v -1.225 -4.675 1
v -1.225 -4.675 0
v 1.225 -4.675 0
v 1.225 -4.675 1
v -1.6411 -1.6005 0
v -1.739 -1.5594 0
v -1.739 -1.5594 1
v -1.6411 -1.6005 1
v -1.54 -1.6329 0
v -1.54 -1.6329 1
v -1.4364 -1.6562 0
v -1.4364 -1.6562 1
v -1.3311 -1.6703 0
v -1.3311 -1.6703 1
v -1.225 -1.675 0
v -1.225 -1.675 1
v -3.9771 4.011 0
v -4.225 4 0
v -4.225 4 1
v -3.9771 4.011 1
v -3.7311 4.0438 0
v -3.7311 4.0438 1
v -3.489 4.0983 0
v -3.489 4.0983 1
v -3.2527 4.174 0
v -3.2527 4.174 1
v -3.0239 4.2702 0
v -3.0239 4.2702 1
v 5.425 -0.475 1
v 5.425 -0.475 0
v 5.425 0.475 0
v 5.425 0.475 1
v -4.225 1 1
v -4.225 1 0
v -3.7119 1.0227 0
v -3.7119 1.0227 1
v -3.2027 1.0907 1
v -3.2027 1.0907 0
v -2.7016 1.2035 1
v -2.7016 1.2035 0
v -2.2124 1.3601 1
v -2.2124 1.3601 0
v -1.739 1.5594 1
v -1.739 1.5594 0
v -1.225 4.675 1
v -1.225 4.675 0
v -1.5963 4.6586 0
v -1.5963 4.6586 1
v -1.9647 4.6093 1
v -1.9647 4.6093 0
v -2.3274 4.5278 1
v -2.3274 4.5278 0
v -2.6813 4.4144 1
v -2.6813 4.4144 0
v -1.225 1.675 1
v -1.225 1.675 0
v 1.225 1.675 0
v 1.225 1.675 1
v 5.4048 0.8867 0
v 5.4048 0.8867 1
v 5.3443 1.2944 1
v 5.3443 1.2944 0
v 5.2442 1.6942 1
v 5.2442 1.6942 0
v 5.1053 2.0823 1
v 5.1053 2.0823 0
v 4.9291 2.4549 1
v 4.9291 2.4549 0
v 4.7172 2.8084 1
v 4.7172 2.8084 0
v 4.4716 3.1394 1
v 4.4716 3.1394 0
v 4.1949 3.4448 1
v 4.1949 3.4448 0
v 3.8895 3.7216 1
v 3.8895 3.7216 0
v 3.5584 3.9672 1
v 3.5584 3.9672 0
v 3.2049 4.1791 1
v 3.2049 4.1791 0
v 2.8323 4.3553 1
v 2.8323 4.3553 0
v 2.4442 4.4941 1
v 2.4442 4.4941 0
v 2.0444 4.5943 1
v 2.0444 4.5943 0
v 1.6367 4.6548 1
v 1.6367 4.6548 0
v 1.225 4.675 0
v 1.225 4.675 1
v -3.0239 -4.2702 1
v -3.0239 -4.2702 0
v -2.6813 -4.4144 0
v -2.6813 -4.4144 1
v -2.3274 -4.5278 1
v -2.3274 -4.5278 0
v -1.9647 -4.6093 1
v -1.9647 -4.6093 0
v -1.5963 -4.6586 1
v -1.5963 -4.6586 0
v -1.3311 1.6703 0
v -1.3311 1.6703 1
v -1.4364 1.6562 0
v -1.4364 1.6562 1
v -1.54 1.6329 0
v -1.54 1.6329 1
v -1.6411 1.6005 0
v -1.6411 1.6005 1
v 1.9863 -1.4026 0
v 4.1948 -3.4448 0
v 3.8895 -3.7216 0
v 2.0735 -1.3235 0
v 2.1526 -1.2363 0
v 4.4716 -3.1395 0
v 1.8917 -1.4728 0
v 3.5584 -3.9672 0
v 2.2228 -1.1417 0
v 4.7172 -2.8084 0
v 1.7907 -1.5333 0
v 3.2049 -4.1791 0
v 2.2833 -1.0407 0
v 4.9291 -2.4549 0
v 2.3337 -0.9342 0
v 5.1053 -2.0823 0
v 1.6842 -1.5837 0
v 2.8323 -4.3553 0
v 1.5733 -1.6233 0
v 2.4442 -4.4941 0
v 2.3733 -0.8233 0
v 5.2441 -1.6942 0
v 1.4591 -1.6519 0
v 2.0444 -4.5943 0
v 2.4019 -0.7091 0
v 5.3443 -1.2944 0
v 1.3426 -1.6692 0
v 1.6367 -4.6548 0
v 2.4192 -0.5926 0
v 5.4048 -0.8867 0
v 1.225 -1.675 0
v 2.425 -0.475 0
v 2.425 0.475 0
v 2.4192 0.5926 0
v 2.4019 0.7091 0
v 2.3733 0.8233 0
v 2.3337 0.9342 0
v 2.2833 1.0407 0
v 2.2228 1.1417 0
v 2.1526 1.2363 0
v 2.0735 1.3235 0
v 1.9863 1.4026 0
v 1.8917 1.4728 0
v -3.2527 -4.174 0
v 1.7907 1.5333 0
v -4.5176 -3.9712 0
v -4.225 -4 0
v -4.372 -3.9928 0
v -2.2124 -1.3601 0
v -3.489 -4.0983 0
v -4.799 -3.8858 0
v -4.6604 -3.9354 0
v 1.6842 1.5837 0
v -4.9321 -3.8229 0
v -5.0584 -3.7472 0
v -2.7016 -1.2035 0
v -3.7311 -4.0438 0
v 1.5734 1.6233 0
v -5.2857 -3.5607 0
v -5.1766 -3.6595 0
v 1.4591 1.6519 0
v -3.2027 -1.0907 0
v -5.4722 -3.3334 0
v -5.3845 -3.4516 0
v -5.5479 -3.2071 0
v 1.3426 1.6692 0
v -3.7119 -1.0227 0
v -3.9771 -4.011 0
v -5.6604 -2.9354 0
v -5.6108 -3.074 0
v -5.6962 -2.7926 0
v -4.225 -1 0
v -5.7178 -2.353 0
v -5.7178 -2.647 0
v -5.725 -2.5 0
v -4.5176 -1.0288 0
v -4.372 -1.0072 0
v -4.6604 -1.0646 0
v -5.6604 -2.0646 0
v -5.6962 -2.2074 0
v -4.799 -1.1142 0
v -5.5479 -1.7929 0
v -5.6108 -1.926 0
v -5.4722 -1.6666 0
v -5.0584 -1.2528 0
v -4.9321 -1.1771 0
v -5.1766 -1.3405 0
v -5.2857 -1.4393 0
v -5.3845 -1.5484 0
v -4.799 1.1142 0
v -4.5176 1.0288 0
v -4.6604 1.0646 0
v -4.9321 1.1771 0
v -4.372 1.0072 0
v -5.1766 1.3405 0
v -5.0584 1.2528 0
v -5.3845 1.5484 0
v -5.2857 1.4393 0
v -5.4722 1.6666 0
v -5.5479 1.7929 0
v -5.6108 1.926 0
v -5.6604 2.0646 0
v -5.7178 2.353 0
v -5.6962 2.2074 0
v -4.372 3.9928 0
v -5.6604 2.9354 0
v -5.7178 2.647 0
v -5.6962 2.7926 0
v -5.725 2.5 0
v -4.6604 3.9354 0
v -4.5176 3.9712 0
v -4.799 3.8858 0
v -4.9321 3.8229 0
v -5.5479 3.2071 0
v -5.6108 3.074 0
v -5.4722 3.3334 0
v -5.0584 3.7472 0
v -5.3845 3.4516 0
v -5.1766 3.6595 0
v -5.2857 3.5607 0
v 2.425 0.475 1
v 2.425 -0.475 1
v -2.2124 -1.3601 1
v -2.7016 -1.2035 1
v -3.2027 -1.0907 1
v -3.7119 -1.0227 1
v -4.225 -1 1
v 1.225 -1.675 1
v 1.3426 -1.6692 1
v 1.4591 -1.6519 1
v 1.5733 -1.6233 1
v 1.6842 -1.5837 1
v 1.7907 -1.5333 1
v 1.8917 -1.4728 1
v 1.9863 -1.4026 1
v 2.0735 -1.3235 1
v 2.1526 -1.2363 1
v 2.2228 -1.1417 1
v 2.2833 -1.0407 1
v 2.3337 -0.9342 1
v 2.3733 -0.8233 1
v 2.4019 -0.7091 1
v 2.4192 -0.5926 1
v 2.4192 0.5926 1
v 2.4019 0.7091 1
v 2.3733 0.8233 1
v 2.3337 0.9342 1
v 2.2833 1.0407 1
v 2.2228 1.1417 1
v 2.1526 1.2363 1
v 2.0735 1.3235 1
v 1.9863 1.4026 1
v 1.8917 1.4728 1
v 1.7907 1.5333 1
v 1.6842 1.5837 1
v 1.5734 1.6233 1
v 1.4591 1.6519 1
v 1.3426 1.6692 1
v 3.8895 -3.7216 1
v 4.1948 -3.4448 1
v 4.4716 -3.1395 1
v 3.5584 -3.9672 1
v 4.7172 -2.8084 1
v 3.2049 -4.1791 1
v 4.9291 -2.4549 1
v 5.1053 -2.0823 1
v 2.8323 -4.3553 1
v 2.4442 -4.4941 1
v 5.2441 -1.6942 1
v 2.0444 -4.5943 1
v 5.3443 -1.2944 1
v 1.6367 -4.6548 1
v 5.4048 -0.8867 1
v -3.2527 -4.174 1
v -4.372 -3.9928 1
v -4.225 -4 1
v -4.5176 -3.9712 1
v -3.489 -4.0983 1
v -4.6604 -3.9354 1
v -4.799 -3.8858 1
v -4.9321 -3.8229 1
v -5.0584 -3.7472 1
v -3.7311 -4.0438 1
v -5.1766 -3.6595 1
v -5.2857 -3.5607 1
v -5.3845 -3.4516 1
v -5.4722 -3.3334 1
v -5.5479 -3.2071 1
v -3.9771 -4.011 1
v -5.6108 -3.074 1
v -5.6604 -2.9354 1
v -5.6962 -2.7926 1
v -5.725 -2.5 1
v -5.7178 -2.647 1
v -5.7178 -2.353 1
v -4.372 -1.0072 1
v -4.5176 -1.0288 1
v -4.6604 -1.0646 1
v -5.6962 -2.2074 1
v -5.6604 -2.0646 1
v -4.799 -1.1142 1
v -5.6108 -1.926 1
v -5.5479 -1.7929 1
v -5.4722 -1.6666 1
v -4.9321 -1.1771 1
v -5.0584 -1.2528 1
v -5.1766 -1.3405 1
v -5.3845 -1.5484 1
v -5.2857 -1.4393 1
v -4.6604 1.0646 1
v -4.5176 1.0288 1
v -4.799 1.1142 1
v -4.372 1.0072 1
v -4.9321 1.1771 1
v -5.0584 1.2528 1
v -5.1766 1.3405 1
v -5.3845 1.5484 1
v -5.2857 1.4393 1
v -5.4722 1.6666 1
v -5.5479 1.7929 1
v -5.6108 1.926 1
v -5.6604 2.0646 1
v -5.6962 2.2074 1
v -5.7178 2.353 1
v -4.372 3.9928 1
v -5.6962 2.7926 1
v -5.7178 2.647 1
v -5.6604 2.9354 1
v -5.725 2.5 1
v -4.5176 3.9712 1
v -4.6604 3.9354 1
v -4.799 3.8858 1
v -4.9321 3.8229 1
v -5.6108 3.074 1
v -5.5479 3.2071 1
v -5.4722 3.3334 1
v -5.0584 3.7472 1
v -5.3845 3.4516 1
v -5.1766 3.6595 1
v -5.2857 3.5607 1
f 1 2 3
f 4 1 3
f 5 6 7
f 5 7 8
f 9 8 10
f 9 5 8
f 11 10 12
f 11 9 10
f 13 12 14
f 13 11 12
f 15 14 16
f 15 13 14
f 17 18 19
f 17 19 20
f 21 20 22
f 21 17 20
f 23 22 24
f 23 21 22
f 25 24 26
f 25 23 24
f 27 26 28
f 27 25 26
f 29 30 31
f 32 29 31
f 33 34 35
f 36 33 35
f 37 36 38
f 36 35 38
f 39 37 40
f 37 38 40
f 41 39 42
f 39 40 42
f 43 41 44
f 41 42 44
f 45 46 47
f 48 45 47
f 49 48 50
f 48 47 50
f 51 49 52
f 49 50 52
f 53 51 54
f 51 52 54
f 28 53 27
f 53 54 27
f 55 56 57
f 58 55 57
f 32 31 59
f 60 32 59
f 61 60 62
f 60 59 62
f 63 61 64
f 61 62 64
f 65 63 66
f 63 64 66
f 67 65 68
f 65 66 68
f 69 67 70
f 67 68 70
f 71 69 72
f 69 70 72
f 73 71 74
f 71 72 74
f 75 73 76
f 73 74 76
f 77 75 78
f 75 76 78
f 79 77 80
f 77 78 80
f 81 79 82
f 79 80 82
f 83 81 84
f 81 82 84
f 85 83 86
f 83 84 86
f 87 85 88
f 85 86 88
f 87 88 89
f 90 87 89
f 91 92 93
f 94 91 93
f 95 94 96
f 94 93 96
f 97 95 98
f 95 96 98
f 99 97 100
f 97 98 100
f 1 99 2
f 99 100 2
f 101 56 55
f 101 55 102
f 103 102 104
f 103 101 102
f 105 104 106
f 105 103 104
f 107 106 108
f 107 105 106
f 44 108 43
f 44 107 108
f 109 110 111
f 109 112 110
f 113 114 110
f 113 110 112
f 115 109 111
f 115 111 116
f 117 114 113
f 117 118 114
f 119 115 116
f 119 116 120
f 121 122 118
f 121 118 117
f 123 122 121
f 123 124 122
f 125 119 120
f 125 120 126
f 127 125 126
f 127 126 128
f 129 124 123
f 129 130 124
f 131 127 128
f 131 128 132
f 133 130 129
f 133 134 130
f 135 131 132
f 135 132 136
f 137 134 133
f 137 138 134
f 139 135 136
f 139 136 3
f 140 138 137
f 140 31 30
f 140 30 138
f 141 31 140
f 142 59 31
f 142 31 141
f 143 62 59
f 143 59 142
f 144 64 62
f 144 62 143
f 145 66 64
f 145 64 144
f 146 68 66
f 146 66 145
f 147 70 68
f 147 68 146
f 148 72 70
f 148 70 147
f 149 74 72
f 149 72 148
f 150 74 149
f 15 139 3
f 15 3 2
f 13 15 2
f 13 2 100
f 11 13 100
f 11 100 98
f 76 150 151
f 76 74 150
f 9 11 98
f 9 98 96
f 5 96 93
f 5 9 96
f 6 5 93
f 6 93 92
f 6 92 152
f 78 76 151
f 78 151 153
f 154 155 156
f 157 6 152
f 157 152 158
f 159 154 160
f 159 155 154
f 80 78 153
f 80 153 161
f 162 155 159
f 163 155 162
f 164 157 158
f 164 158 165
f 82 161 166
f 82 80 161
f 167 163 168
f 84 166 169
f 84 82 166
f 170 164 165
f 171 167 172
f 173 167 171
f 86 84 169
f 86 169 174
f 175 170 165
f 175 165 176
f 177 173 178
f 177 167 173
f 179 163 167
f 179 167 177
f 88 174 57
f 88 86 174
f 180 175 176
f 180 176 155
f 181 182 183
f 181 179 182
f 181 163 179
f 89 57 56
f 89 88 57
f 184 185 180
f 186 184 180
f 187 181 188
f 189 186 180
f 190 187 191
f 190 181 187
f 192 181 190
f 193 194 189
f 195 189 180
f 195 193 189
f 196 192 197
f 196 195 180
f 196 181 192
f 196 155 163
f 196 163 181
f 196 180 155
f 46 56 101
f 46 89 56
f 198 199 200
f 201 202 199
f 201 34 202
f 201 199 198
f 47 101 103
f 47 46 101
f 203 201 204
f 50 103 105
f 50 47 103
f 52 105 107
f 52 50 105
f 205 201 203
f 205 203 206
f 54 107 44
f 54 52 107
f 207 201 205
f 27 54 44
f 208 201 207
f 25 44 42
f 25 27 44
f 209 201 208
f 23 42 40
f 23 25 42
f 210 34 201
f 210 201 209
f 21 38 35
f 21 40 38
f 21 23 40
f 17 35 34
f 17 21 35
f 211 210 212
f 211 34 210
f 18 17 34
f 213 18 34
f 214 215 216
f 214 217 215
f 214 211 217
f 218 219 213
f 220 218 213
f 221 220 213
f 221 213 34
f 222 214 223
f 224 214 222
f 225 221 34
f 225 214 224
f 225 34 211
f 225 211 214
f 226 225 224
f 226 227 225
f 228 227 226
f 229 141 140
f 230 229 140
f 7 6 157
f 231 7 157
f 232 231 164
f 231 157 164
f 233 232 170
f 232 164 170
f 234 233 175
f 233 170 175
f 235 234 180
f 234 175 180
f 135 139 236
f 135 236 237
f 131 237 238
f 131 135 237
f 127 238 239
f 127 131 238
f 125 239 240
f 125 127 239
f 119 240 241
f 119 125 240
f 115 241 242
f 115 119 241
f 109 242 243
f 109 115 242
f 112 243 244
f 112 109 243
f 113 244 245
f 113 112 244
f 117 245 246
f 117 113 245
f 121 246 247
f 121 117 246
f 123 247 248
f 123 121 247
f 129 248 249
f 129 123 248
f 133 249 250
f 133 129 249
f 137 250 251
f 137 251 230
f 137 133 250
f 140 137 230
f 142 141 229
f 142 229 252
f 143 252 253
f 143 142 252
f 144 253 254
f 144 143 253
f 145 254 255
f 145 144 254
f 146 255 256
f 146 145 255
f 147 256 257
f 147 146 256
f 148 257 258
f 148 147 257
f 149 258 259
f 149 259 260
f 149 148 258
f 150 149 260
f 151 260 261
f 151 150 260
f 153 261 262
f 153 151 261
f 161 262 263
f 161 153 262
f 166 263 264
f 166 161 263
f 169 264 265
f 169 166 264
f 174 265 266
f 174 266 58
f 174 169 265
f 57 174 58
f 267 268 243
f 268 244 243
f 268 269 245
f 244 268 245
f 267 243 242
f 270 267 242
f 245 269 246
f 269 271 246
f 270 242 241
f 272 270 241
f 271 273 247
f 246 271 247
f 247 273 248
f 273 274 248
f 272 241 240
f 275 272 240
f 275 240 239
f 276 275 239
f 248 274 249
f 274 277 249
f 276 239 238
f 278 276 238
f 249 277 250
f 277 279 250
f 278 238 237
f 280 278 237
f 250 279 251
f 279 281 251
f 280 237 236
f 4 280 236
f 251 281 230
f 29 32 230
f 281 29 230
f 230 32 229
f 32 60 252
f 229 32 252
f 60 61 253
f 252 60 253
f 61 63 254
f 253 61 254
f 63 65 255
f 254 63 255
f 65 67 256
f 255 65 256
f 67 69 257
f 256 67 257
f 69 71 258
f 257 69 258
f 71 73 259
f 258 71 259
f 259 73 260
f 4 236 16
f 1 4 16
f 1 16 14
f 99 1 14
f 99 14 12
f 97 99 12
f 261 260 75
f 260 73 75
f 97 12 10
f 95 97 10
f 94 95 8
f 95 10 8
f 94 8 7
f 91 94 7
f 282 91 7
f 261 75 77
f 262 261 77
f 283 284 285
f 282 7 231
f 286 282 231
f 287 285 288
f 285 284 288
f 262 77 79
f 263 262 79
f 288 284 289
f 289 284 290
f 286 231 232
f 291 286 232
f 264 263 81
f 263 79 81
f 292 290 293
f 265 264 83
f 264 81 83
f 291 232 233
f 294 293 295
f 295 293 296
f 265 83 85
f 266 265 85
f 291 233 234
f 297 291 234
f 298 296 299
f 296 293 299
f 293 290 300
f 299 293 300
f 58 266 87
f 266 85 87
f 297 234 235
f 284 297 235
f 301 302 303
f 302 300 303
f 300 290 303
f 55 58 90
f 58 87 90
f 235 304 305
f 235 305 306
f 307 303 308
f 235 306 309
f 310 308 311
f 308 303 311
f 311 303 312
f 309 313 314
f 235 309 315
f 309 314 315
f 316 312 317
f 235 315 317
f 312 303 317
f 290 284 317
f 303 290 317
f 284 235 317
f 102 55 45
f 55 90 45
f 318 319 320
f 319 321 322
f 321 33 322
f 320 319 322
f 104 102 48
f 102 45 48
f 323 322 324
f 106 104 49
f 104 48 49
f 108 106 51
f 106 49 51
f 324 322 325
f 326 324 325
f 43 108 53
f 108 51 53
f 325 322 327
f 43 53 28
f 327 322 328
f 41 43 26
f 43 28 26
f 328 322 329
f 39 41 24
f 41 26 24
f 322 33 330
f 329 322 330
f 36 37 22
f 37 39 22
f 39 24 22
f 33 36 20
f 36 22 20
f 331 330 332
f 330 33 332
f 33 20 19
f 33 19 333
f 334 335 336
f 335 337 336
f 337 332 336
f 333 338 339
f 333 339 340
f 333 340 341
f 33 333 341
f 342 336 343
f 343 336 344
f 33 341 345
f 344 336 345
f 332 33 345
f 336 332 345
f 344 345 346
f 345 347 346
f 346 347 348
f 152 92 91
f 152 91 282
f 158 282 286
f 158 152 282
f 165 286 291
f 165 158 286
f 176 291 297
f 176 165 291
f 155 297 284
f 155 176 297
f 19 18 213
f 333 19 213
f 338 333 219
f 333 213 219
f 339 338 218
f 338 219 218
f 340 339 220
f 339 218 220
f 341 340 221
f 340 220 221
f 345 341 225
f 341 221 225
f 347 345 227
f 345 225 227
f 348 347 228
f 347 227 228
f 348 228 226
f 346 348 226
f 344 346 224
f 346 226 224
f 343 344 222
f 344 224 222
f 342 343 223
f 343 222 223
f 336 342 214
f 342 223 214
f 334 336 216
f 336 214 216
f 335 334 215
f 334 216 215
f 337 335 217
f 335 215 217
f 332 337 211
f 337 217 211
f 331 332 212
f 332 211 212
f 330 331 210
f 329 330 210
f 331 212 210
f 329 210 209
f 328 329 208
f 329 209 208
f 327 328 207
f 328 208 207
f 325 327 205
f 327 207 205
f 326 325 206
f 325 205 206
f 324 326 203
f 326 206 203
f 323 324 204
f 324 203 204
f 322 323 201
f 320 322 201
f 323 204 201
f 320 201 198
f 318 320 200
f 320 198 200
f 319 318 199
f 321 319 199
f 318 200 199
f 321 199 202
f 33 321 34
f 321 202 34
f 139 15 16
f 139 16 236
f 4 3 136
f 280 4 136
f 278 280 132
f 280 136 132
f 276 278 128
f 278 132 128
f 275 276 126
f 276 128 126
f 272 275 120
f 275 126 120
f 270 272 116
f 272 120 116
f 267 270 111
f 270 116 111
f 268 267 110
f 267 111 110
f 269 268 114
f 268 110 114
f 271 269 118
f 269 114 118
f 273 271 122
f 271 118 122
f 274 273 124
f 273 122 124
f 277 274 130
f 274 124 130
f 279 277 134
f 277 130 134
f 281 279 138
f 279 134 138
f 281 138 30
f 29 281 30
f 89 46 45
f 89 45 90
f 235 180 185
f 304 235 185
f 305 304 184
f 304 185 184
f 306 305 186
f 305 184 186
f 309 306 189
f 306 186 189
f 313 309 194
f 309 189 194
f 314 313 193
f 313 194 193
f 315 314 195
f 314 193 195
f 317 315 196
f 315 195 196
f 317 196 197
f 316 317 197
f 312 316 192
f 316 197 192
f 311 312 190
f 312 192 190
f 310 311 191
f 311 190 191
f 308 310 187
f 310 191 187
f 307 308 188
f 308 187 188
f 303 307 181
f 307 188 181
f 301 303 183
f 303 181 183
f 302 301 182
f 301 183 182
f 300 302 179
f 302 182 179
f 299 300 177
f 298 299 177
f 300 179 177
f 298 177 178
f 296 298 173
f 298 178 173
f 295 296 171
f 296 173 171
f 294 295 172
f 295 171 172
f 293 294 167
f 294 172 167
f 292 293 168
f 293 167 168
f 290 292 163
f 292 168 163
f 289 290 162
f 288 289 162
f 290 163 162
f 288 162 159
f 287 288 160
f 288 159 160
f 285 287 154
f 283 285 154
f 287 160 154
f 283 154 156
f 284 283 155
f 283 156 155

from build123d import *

# Parameters (mm, degrees)
PAD_DEPTH = 1


with BuildPart() as part:
    # Sketch → Pad (new body)
    with BuildSketch(Plane.XY):
        with BuildLine():
            ThreePointArc((-1.225, 1.675), (-1.488415, 1.645732), (-1.73898, 1.559355))
            ThreePointArc((-4.225, 1), (-2.950915, 1.141565), (-1.73898, 1.559355))
            ThreePointArc((-4.225, 4), (-5.725, 2.5), (-4.225, 1))
            ThreePointArc((-4.225, 4), (-3.609451, 4.068394), (-3.023929, 4.270241))
            ThreePointArc((-1.225, 4.675), (-2.146951, 4.572561), (-3.023929, 4.270241))
            Line((-1.225, 4.675), (1.225012, 4.675))
            ThreePointArc((5.425, 0.475), (4.194853, 3.444844), (1.225012, 4.675))
            Line((5.425, -0.475), (5.425, 0.475))
            ThreePointArc((1.225, -4.675), (4.194848, -3.444848), (5.425, -0.475))
            Line((-1.225, -4.675), (1.225, -4.675))
            ThreePointArc((-3.023929, -4.270241), (-2.146951, -4.572561), (-1.225, -4.675))
            ThreePointArc((-3.023929, -4.270241), (-3.609451, -4.068394), (-4.225, -4))
            ThreePointArc((-4.225, -1), (-5.725, -2.5), (-4.225, -4))
            ThreePointArc((-1.73898, -1.559355), (-2.950915, -1.141565), (-4.225, -1))
            ThreePointArc((-1.73898, -1.559355), (-1.488415, -1.645732), (-1.225, -1.675))
            Line((-1.225, -1.675), (1.225, -1.675))
            ThreePointArc((1.225, -1.675), (2.073528, -1.323528), (2.425, -0.475))
            Line((2.425, 0.475), (2.425, -0.475))
            ThreePointArc((2.425, 0.475), (2.073532, 1.323524), (1.225012, 1.675))
            Line((-1.225, 1.675), (1.225012, 1.675))
        make_face()
    extrude(amount=PAD_DEPTH)


solid = part.part
